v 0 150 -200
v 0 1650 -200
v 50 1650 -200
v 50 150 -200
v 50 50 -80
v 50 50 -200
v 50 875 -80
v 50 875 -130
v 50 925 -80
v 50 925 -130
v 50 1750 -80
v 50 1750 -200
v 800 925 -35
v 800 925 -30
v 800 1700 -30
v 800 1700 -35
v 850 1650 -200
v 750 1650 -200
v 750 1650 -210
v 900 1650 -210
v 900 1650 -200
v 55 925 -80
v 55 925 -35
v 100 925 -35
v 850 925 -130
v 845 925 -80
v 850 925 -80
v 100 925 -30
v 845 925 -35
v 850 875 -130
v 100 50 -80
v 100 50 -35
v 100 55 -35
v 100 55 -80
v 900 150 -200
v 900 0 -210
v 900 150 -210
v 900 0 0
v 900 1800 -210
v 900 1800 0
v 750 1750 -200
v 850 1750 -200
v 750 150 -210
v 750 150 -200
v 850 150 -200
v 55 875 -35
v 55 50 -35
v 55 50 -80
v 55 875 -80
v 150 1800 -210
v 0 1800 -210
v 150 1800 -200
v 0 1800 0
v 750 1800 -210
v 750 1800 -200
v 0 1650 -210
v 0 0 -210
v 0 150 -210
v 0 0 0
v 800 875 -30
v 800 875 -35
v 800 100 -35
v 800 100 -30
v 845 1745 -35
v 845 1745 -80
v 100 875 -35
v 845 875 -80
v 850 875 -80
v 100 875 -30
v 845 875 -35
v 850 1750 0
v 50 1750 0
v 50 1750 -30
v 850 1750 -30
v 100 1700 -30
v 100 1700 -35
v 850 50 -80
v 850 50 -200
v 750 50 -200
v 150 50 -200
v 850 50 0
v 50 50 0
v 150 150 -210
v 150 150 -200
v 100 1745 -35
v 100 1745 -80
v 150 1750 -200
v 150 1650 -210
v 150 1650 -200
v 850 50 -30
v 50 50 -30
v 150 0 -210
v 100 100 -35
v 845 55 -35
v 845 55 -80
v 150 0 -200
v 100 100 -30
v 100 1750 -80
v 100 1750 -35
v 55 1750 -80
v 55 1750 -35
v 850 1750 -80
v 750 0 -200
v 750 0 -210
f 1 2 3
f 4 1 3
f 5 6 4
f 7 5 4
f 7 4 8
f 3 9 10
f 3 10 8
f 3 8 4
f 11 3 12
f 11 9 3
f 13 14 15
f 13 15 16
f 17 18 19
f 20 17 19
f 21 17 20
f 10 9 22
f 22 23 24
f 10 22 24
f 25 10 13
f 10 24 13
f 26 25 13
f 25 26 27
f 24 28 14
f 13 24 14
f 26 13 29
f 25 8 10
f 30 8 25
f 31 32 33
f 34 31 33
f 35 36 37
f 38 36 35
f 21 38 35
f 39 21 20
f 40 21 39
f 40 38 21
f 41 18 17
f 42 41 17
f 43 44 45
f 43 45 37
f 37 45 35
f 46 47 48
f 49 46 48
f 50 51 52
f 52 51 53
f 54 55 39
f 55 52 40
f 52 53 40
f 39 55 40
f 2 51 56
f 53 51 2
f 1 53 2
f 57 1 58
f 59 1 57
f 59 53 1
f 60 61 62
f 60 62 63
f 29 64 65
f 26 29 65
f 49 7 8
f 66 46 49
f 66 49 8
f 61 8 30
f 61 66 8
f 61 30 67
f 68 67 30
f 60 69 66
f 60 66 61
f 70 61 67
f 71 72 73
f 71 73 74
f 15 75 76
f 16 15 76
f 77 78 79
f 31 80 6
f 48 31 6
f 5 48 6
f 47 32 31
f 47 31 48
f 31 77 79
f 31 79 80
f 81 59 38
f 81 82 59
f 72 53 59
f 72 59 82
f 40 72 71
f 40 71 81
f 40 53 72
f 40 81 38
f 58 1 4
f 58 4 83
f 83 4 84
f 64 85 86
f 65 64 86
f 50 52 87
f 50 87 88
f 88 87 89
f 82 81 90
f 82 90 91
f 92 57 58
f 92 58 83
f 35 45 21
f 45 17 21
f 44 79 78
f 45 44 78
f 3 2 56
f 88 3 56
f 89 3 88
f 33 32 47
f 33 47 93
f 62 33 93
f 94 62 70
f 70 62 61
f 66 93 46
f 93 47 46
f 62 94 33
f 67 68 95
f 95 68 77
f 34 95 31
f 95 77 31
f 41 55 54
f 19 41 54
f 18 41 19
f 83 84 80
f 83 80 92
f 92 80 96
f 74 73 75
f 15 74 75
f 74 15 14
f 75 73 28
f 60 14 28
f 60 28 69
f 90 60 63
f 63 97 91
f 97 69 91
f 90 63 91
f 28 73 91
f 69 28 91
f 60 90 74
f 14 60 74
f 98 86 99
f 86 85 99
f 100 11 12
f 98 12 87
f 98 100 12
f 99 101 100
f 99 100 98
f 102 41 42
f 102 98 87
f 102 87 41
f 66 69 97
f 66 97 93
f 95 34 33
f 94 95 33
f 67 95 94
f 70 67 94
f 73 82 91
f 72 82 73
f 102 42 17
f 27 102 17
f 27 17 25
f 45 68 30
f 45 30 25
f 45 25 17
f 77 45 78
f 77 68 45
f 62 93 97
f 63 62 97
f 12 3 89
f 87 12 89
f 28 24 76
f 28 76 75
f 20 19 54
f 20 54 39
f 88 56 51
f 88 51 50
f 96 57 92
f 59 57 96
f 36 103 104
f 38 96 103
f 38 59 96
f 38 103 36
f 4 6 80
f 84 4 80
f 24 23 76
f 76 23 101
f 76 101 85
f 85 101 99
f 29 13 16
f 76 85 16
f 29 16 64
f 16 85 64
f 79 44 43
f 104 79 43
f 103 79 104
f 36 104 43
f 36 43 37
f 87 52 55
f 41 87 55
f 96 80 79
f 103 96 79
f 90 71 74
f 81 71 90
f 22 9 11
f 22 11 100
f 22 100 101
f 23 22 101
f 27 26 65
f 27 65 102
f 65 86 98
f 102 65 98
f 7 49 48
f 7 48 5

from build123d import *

# Parameters (mm, degrees)
F0_W      = 900
F0_H      = 1800
F0_W_2    = 800
F0_H_2    = 50
F1_DEPTH  = 200
F2_W      = 800
F2_H      = 30
F3_DEPTH  = 50
F4_W      = 800
F4_H      = 70
F5_DEPTH  = 50
F6_W      = 150
F6_H      = 150
F7_DEPTH  = 10
F9_DEPTH  = 825
F11_DEPTH = 825


with BuildPart() as f1:
    # F0 (on Top) → F1 (new body)
    with BuildSketch(Plane.XY):
        with Locations((450, 900)):
            Rectangle(F0_W, F0_H)
        Polygon((850, 50), (50, 50), (50, 875), (50, 925), (50, 1750), (850, 1750), (850, 925), (850, 875), align=None, mode=Mode.SUBTRACT)
        with Locations((450, 900)):
            Rectangle(F0_W_2, F0_H_2)
    extrude(amount=-F1_DEPTH)

    # F2 (on face) → F3 (cut, through all)
    with BuildSketch(Plane.XZ.offset(-875)):
        with Locations((450, -15)):
            Rectangle(F2_W, F2_H)
    extrude(amount=-F3_DEPTH, mode=Mode.SUBTRACT)

    # F4 (on face) → F5 (cut, through all)
    with BuildSketch(Plane.XZ.offset(-875)):
        with Locations((450, -165)):
            Rectangle(F4_W, F4_H)
    extrude(amount=-F5_DEPTH, mode=Mode.SUBTRACT)

    # F6 (on face) → F7 (join)
    with BuildSketch(Plane(origin=(0, 0, -200), x_dir=(1, 0, 0), z_dir=(0, 0, -1))):
        with Locations((75, -75)):
            Rectangle(F6_W, F6_H)
        with Locations((825, -75)):
            Rectangle(F6_W, F6_H)
        with Locations((75, -1725)):
            Rectangle(F6_W, F6_H)
        with Locations((825, -1725)):
            Rectangle(F6_W, F6_H)
    extrude(amount=F7_DEPTH)

    # F8 (on face) → F9 (join, through all)
    with BuildSketch(Plane.XZ.offset(-1750)):
        Polygon((100, -30), (50, -30), (50, -80), (55, -80), (55, -35), (100, -35), align=None)
        Polygon((845, -35), (845, -80), (850, -80), (850, -30), (800, -30), (800, -35), align=None)
    extrude(amount=F9_DEPTH)

    # F10 (on face) → F11 (join, through all)
    with BuildSketch(Plane(origin=(0, 50, 0), x_dir=(-1, 0, 0), z_dir=(0, 1, 0))):
        Polygon((-800, -30), (-850, -30), (-850, -80), (-845, -80), (-845, -35), (-800, -35), align=None)
        Polygon((-55, -35), (-55, -80), (-50, -80), (-50, -30), (-100, -30), (-100, -35), align=None)
    extrude(amount=F11_DEPTH)

    # F12 (on face) → F13 (join, up to the next surface of F1)
    with BuildSketch(Plane.YZ.offset(100)):
        Polygon((100, -30), (50, -30), (50, -80), (55, -80), (55, -35), (100, -35), align=None)
    extrude(until=Until.NEXT)

    # F14 (on face) → F15 (join, up to the next surface of F1)
    with BuildSketch(Plane.YZ.offset(100)):
        Polygon((1750, -80), (1750, -30), (1700, -30), (1700, -35), (1745, -35), (1745, -80), align=None)
    extrude(until=Until.NEXT)


solid = f1.part
